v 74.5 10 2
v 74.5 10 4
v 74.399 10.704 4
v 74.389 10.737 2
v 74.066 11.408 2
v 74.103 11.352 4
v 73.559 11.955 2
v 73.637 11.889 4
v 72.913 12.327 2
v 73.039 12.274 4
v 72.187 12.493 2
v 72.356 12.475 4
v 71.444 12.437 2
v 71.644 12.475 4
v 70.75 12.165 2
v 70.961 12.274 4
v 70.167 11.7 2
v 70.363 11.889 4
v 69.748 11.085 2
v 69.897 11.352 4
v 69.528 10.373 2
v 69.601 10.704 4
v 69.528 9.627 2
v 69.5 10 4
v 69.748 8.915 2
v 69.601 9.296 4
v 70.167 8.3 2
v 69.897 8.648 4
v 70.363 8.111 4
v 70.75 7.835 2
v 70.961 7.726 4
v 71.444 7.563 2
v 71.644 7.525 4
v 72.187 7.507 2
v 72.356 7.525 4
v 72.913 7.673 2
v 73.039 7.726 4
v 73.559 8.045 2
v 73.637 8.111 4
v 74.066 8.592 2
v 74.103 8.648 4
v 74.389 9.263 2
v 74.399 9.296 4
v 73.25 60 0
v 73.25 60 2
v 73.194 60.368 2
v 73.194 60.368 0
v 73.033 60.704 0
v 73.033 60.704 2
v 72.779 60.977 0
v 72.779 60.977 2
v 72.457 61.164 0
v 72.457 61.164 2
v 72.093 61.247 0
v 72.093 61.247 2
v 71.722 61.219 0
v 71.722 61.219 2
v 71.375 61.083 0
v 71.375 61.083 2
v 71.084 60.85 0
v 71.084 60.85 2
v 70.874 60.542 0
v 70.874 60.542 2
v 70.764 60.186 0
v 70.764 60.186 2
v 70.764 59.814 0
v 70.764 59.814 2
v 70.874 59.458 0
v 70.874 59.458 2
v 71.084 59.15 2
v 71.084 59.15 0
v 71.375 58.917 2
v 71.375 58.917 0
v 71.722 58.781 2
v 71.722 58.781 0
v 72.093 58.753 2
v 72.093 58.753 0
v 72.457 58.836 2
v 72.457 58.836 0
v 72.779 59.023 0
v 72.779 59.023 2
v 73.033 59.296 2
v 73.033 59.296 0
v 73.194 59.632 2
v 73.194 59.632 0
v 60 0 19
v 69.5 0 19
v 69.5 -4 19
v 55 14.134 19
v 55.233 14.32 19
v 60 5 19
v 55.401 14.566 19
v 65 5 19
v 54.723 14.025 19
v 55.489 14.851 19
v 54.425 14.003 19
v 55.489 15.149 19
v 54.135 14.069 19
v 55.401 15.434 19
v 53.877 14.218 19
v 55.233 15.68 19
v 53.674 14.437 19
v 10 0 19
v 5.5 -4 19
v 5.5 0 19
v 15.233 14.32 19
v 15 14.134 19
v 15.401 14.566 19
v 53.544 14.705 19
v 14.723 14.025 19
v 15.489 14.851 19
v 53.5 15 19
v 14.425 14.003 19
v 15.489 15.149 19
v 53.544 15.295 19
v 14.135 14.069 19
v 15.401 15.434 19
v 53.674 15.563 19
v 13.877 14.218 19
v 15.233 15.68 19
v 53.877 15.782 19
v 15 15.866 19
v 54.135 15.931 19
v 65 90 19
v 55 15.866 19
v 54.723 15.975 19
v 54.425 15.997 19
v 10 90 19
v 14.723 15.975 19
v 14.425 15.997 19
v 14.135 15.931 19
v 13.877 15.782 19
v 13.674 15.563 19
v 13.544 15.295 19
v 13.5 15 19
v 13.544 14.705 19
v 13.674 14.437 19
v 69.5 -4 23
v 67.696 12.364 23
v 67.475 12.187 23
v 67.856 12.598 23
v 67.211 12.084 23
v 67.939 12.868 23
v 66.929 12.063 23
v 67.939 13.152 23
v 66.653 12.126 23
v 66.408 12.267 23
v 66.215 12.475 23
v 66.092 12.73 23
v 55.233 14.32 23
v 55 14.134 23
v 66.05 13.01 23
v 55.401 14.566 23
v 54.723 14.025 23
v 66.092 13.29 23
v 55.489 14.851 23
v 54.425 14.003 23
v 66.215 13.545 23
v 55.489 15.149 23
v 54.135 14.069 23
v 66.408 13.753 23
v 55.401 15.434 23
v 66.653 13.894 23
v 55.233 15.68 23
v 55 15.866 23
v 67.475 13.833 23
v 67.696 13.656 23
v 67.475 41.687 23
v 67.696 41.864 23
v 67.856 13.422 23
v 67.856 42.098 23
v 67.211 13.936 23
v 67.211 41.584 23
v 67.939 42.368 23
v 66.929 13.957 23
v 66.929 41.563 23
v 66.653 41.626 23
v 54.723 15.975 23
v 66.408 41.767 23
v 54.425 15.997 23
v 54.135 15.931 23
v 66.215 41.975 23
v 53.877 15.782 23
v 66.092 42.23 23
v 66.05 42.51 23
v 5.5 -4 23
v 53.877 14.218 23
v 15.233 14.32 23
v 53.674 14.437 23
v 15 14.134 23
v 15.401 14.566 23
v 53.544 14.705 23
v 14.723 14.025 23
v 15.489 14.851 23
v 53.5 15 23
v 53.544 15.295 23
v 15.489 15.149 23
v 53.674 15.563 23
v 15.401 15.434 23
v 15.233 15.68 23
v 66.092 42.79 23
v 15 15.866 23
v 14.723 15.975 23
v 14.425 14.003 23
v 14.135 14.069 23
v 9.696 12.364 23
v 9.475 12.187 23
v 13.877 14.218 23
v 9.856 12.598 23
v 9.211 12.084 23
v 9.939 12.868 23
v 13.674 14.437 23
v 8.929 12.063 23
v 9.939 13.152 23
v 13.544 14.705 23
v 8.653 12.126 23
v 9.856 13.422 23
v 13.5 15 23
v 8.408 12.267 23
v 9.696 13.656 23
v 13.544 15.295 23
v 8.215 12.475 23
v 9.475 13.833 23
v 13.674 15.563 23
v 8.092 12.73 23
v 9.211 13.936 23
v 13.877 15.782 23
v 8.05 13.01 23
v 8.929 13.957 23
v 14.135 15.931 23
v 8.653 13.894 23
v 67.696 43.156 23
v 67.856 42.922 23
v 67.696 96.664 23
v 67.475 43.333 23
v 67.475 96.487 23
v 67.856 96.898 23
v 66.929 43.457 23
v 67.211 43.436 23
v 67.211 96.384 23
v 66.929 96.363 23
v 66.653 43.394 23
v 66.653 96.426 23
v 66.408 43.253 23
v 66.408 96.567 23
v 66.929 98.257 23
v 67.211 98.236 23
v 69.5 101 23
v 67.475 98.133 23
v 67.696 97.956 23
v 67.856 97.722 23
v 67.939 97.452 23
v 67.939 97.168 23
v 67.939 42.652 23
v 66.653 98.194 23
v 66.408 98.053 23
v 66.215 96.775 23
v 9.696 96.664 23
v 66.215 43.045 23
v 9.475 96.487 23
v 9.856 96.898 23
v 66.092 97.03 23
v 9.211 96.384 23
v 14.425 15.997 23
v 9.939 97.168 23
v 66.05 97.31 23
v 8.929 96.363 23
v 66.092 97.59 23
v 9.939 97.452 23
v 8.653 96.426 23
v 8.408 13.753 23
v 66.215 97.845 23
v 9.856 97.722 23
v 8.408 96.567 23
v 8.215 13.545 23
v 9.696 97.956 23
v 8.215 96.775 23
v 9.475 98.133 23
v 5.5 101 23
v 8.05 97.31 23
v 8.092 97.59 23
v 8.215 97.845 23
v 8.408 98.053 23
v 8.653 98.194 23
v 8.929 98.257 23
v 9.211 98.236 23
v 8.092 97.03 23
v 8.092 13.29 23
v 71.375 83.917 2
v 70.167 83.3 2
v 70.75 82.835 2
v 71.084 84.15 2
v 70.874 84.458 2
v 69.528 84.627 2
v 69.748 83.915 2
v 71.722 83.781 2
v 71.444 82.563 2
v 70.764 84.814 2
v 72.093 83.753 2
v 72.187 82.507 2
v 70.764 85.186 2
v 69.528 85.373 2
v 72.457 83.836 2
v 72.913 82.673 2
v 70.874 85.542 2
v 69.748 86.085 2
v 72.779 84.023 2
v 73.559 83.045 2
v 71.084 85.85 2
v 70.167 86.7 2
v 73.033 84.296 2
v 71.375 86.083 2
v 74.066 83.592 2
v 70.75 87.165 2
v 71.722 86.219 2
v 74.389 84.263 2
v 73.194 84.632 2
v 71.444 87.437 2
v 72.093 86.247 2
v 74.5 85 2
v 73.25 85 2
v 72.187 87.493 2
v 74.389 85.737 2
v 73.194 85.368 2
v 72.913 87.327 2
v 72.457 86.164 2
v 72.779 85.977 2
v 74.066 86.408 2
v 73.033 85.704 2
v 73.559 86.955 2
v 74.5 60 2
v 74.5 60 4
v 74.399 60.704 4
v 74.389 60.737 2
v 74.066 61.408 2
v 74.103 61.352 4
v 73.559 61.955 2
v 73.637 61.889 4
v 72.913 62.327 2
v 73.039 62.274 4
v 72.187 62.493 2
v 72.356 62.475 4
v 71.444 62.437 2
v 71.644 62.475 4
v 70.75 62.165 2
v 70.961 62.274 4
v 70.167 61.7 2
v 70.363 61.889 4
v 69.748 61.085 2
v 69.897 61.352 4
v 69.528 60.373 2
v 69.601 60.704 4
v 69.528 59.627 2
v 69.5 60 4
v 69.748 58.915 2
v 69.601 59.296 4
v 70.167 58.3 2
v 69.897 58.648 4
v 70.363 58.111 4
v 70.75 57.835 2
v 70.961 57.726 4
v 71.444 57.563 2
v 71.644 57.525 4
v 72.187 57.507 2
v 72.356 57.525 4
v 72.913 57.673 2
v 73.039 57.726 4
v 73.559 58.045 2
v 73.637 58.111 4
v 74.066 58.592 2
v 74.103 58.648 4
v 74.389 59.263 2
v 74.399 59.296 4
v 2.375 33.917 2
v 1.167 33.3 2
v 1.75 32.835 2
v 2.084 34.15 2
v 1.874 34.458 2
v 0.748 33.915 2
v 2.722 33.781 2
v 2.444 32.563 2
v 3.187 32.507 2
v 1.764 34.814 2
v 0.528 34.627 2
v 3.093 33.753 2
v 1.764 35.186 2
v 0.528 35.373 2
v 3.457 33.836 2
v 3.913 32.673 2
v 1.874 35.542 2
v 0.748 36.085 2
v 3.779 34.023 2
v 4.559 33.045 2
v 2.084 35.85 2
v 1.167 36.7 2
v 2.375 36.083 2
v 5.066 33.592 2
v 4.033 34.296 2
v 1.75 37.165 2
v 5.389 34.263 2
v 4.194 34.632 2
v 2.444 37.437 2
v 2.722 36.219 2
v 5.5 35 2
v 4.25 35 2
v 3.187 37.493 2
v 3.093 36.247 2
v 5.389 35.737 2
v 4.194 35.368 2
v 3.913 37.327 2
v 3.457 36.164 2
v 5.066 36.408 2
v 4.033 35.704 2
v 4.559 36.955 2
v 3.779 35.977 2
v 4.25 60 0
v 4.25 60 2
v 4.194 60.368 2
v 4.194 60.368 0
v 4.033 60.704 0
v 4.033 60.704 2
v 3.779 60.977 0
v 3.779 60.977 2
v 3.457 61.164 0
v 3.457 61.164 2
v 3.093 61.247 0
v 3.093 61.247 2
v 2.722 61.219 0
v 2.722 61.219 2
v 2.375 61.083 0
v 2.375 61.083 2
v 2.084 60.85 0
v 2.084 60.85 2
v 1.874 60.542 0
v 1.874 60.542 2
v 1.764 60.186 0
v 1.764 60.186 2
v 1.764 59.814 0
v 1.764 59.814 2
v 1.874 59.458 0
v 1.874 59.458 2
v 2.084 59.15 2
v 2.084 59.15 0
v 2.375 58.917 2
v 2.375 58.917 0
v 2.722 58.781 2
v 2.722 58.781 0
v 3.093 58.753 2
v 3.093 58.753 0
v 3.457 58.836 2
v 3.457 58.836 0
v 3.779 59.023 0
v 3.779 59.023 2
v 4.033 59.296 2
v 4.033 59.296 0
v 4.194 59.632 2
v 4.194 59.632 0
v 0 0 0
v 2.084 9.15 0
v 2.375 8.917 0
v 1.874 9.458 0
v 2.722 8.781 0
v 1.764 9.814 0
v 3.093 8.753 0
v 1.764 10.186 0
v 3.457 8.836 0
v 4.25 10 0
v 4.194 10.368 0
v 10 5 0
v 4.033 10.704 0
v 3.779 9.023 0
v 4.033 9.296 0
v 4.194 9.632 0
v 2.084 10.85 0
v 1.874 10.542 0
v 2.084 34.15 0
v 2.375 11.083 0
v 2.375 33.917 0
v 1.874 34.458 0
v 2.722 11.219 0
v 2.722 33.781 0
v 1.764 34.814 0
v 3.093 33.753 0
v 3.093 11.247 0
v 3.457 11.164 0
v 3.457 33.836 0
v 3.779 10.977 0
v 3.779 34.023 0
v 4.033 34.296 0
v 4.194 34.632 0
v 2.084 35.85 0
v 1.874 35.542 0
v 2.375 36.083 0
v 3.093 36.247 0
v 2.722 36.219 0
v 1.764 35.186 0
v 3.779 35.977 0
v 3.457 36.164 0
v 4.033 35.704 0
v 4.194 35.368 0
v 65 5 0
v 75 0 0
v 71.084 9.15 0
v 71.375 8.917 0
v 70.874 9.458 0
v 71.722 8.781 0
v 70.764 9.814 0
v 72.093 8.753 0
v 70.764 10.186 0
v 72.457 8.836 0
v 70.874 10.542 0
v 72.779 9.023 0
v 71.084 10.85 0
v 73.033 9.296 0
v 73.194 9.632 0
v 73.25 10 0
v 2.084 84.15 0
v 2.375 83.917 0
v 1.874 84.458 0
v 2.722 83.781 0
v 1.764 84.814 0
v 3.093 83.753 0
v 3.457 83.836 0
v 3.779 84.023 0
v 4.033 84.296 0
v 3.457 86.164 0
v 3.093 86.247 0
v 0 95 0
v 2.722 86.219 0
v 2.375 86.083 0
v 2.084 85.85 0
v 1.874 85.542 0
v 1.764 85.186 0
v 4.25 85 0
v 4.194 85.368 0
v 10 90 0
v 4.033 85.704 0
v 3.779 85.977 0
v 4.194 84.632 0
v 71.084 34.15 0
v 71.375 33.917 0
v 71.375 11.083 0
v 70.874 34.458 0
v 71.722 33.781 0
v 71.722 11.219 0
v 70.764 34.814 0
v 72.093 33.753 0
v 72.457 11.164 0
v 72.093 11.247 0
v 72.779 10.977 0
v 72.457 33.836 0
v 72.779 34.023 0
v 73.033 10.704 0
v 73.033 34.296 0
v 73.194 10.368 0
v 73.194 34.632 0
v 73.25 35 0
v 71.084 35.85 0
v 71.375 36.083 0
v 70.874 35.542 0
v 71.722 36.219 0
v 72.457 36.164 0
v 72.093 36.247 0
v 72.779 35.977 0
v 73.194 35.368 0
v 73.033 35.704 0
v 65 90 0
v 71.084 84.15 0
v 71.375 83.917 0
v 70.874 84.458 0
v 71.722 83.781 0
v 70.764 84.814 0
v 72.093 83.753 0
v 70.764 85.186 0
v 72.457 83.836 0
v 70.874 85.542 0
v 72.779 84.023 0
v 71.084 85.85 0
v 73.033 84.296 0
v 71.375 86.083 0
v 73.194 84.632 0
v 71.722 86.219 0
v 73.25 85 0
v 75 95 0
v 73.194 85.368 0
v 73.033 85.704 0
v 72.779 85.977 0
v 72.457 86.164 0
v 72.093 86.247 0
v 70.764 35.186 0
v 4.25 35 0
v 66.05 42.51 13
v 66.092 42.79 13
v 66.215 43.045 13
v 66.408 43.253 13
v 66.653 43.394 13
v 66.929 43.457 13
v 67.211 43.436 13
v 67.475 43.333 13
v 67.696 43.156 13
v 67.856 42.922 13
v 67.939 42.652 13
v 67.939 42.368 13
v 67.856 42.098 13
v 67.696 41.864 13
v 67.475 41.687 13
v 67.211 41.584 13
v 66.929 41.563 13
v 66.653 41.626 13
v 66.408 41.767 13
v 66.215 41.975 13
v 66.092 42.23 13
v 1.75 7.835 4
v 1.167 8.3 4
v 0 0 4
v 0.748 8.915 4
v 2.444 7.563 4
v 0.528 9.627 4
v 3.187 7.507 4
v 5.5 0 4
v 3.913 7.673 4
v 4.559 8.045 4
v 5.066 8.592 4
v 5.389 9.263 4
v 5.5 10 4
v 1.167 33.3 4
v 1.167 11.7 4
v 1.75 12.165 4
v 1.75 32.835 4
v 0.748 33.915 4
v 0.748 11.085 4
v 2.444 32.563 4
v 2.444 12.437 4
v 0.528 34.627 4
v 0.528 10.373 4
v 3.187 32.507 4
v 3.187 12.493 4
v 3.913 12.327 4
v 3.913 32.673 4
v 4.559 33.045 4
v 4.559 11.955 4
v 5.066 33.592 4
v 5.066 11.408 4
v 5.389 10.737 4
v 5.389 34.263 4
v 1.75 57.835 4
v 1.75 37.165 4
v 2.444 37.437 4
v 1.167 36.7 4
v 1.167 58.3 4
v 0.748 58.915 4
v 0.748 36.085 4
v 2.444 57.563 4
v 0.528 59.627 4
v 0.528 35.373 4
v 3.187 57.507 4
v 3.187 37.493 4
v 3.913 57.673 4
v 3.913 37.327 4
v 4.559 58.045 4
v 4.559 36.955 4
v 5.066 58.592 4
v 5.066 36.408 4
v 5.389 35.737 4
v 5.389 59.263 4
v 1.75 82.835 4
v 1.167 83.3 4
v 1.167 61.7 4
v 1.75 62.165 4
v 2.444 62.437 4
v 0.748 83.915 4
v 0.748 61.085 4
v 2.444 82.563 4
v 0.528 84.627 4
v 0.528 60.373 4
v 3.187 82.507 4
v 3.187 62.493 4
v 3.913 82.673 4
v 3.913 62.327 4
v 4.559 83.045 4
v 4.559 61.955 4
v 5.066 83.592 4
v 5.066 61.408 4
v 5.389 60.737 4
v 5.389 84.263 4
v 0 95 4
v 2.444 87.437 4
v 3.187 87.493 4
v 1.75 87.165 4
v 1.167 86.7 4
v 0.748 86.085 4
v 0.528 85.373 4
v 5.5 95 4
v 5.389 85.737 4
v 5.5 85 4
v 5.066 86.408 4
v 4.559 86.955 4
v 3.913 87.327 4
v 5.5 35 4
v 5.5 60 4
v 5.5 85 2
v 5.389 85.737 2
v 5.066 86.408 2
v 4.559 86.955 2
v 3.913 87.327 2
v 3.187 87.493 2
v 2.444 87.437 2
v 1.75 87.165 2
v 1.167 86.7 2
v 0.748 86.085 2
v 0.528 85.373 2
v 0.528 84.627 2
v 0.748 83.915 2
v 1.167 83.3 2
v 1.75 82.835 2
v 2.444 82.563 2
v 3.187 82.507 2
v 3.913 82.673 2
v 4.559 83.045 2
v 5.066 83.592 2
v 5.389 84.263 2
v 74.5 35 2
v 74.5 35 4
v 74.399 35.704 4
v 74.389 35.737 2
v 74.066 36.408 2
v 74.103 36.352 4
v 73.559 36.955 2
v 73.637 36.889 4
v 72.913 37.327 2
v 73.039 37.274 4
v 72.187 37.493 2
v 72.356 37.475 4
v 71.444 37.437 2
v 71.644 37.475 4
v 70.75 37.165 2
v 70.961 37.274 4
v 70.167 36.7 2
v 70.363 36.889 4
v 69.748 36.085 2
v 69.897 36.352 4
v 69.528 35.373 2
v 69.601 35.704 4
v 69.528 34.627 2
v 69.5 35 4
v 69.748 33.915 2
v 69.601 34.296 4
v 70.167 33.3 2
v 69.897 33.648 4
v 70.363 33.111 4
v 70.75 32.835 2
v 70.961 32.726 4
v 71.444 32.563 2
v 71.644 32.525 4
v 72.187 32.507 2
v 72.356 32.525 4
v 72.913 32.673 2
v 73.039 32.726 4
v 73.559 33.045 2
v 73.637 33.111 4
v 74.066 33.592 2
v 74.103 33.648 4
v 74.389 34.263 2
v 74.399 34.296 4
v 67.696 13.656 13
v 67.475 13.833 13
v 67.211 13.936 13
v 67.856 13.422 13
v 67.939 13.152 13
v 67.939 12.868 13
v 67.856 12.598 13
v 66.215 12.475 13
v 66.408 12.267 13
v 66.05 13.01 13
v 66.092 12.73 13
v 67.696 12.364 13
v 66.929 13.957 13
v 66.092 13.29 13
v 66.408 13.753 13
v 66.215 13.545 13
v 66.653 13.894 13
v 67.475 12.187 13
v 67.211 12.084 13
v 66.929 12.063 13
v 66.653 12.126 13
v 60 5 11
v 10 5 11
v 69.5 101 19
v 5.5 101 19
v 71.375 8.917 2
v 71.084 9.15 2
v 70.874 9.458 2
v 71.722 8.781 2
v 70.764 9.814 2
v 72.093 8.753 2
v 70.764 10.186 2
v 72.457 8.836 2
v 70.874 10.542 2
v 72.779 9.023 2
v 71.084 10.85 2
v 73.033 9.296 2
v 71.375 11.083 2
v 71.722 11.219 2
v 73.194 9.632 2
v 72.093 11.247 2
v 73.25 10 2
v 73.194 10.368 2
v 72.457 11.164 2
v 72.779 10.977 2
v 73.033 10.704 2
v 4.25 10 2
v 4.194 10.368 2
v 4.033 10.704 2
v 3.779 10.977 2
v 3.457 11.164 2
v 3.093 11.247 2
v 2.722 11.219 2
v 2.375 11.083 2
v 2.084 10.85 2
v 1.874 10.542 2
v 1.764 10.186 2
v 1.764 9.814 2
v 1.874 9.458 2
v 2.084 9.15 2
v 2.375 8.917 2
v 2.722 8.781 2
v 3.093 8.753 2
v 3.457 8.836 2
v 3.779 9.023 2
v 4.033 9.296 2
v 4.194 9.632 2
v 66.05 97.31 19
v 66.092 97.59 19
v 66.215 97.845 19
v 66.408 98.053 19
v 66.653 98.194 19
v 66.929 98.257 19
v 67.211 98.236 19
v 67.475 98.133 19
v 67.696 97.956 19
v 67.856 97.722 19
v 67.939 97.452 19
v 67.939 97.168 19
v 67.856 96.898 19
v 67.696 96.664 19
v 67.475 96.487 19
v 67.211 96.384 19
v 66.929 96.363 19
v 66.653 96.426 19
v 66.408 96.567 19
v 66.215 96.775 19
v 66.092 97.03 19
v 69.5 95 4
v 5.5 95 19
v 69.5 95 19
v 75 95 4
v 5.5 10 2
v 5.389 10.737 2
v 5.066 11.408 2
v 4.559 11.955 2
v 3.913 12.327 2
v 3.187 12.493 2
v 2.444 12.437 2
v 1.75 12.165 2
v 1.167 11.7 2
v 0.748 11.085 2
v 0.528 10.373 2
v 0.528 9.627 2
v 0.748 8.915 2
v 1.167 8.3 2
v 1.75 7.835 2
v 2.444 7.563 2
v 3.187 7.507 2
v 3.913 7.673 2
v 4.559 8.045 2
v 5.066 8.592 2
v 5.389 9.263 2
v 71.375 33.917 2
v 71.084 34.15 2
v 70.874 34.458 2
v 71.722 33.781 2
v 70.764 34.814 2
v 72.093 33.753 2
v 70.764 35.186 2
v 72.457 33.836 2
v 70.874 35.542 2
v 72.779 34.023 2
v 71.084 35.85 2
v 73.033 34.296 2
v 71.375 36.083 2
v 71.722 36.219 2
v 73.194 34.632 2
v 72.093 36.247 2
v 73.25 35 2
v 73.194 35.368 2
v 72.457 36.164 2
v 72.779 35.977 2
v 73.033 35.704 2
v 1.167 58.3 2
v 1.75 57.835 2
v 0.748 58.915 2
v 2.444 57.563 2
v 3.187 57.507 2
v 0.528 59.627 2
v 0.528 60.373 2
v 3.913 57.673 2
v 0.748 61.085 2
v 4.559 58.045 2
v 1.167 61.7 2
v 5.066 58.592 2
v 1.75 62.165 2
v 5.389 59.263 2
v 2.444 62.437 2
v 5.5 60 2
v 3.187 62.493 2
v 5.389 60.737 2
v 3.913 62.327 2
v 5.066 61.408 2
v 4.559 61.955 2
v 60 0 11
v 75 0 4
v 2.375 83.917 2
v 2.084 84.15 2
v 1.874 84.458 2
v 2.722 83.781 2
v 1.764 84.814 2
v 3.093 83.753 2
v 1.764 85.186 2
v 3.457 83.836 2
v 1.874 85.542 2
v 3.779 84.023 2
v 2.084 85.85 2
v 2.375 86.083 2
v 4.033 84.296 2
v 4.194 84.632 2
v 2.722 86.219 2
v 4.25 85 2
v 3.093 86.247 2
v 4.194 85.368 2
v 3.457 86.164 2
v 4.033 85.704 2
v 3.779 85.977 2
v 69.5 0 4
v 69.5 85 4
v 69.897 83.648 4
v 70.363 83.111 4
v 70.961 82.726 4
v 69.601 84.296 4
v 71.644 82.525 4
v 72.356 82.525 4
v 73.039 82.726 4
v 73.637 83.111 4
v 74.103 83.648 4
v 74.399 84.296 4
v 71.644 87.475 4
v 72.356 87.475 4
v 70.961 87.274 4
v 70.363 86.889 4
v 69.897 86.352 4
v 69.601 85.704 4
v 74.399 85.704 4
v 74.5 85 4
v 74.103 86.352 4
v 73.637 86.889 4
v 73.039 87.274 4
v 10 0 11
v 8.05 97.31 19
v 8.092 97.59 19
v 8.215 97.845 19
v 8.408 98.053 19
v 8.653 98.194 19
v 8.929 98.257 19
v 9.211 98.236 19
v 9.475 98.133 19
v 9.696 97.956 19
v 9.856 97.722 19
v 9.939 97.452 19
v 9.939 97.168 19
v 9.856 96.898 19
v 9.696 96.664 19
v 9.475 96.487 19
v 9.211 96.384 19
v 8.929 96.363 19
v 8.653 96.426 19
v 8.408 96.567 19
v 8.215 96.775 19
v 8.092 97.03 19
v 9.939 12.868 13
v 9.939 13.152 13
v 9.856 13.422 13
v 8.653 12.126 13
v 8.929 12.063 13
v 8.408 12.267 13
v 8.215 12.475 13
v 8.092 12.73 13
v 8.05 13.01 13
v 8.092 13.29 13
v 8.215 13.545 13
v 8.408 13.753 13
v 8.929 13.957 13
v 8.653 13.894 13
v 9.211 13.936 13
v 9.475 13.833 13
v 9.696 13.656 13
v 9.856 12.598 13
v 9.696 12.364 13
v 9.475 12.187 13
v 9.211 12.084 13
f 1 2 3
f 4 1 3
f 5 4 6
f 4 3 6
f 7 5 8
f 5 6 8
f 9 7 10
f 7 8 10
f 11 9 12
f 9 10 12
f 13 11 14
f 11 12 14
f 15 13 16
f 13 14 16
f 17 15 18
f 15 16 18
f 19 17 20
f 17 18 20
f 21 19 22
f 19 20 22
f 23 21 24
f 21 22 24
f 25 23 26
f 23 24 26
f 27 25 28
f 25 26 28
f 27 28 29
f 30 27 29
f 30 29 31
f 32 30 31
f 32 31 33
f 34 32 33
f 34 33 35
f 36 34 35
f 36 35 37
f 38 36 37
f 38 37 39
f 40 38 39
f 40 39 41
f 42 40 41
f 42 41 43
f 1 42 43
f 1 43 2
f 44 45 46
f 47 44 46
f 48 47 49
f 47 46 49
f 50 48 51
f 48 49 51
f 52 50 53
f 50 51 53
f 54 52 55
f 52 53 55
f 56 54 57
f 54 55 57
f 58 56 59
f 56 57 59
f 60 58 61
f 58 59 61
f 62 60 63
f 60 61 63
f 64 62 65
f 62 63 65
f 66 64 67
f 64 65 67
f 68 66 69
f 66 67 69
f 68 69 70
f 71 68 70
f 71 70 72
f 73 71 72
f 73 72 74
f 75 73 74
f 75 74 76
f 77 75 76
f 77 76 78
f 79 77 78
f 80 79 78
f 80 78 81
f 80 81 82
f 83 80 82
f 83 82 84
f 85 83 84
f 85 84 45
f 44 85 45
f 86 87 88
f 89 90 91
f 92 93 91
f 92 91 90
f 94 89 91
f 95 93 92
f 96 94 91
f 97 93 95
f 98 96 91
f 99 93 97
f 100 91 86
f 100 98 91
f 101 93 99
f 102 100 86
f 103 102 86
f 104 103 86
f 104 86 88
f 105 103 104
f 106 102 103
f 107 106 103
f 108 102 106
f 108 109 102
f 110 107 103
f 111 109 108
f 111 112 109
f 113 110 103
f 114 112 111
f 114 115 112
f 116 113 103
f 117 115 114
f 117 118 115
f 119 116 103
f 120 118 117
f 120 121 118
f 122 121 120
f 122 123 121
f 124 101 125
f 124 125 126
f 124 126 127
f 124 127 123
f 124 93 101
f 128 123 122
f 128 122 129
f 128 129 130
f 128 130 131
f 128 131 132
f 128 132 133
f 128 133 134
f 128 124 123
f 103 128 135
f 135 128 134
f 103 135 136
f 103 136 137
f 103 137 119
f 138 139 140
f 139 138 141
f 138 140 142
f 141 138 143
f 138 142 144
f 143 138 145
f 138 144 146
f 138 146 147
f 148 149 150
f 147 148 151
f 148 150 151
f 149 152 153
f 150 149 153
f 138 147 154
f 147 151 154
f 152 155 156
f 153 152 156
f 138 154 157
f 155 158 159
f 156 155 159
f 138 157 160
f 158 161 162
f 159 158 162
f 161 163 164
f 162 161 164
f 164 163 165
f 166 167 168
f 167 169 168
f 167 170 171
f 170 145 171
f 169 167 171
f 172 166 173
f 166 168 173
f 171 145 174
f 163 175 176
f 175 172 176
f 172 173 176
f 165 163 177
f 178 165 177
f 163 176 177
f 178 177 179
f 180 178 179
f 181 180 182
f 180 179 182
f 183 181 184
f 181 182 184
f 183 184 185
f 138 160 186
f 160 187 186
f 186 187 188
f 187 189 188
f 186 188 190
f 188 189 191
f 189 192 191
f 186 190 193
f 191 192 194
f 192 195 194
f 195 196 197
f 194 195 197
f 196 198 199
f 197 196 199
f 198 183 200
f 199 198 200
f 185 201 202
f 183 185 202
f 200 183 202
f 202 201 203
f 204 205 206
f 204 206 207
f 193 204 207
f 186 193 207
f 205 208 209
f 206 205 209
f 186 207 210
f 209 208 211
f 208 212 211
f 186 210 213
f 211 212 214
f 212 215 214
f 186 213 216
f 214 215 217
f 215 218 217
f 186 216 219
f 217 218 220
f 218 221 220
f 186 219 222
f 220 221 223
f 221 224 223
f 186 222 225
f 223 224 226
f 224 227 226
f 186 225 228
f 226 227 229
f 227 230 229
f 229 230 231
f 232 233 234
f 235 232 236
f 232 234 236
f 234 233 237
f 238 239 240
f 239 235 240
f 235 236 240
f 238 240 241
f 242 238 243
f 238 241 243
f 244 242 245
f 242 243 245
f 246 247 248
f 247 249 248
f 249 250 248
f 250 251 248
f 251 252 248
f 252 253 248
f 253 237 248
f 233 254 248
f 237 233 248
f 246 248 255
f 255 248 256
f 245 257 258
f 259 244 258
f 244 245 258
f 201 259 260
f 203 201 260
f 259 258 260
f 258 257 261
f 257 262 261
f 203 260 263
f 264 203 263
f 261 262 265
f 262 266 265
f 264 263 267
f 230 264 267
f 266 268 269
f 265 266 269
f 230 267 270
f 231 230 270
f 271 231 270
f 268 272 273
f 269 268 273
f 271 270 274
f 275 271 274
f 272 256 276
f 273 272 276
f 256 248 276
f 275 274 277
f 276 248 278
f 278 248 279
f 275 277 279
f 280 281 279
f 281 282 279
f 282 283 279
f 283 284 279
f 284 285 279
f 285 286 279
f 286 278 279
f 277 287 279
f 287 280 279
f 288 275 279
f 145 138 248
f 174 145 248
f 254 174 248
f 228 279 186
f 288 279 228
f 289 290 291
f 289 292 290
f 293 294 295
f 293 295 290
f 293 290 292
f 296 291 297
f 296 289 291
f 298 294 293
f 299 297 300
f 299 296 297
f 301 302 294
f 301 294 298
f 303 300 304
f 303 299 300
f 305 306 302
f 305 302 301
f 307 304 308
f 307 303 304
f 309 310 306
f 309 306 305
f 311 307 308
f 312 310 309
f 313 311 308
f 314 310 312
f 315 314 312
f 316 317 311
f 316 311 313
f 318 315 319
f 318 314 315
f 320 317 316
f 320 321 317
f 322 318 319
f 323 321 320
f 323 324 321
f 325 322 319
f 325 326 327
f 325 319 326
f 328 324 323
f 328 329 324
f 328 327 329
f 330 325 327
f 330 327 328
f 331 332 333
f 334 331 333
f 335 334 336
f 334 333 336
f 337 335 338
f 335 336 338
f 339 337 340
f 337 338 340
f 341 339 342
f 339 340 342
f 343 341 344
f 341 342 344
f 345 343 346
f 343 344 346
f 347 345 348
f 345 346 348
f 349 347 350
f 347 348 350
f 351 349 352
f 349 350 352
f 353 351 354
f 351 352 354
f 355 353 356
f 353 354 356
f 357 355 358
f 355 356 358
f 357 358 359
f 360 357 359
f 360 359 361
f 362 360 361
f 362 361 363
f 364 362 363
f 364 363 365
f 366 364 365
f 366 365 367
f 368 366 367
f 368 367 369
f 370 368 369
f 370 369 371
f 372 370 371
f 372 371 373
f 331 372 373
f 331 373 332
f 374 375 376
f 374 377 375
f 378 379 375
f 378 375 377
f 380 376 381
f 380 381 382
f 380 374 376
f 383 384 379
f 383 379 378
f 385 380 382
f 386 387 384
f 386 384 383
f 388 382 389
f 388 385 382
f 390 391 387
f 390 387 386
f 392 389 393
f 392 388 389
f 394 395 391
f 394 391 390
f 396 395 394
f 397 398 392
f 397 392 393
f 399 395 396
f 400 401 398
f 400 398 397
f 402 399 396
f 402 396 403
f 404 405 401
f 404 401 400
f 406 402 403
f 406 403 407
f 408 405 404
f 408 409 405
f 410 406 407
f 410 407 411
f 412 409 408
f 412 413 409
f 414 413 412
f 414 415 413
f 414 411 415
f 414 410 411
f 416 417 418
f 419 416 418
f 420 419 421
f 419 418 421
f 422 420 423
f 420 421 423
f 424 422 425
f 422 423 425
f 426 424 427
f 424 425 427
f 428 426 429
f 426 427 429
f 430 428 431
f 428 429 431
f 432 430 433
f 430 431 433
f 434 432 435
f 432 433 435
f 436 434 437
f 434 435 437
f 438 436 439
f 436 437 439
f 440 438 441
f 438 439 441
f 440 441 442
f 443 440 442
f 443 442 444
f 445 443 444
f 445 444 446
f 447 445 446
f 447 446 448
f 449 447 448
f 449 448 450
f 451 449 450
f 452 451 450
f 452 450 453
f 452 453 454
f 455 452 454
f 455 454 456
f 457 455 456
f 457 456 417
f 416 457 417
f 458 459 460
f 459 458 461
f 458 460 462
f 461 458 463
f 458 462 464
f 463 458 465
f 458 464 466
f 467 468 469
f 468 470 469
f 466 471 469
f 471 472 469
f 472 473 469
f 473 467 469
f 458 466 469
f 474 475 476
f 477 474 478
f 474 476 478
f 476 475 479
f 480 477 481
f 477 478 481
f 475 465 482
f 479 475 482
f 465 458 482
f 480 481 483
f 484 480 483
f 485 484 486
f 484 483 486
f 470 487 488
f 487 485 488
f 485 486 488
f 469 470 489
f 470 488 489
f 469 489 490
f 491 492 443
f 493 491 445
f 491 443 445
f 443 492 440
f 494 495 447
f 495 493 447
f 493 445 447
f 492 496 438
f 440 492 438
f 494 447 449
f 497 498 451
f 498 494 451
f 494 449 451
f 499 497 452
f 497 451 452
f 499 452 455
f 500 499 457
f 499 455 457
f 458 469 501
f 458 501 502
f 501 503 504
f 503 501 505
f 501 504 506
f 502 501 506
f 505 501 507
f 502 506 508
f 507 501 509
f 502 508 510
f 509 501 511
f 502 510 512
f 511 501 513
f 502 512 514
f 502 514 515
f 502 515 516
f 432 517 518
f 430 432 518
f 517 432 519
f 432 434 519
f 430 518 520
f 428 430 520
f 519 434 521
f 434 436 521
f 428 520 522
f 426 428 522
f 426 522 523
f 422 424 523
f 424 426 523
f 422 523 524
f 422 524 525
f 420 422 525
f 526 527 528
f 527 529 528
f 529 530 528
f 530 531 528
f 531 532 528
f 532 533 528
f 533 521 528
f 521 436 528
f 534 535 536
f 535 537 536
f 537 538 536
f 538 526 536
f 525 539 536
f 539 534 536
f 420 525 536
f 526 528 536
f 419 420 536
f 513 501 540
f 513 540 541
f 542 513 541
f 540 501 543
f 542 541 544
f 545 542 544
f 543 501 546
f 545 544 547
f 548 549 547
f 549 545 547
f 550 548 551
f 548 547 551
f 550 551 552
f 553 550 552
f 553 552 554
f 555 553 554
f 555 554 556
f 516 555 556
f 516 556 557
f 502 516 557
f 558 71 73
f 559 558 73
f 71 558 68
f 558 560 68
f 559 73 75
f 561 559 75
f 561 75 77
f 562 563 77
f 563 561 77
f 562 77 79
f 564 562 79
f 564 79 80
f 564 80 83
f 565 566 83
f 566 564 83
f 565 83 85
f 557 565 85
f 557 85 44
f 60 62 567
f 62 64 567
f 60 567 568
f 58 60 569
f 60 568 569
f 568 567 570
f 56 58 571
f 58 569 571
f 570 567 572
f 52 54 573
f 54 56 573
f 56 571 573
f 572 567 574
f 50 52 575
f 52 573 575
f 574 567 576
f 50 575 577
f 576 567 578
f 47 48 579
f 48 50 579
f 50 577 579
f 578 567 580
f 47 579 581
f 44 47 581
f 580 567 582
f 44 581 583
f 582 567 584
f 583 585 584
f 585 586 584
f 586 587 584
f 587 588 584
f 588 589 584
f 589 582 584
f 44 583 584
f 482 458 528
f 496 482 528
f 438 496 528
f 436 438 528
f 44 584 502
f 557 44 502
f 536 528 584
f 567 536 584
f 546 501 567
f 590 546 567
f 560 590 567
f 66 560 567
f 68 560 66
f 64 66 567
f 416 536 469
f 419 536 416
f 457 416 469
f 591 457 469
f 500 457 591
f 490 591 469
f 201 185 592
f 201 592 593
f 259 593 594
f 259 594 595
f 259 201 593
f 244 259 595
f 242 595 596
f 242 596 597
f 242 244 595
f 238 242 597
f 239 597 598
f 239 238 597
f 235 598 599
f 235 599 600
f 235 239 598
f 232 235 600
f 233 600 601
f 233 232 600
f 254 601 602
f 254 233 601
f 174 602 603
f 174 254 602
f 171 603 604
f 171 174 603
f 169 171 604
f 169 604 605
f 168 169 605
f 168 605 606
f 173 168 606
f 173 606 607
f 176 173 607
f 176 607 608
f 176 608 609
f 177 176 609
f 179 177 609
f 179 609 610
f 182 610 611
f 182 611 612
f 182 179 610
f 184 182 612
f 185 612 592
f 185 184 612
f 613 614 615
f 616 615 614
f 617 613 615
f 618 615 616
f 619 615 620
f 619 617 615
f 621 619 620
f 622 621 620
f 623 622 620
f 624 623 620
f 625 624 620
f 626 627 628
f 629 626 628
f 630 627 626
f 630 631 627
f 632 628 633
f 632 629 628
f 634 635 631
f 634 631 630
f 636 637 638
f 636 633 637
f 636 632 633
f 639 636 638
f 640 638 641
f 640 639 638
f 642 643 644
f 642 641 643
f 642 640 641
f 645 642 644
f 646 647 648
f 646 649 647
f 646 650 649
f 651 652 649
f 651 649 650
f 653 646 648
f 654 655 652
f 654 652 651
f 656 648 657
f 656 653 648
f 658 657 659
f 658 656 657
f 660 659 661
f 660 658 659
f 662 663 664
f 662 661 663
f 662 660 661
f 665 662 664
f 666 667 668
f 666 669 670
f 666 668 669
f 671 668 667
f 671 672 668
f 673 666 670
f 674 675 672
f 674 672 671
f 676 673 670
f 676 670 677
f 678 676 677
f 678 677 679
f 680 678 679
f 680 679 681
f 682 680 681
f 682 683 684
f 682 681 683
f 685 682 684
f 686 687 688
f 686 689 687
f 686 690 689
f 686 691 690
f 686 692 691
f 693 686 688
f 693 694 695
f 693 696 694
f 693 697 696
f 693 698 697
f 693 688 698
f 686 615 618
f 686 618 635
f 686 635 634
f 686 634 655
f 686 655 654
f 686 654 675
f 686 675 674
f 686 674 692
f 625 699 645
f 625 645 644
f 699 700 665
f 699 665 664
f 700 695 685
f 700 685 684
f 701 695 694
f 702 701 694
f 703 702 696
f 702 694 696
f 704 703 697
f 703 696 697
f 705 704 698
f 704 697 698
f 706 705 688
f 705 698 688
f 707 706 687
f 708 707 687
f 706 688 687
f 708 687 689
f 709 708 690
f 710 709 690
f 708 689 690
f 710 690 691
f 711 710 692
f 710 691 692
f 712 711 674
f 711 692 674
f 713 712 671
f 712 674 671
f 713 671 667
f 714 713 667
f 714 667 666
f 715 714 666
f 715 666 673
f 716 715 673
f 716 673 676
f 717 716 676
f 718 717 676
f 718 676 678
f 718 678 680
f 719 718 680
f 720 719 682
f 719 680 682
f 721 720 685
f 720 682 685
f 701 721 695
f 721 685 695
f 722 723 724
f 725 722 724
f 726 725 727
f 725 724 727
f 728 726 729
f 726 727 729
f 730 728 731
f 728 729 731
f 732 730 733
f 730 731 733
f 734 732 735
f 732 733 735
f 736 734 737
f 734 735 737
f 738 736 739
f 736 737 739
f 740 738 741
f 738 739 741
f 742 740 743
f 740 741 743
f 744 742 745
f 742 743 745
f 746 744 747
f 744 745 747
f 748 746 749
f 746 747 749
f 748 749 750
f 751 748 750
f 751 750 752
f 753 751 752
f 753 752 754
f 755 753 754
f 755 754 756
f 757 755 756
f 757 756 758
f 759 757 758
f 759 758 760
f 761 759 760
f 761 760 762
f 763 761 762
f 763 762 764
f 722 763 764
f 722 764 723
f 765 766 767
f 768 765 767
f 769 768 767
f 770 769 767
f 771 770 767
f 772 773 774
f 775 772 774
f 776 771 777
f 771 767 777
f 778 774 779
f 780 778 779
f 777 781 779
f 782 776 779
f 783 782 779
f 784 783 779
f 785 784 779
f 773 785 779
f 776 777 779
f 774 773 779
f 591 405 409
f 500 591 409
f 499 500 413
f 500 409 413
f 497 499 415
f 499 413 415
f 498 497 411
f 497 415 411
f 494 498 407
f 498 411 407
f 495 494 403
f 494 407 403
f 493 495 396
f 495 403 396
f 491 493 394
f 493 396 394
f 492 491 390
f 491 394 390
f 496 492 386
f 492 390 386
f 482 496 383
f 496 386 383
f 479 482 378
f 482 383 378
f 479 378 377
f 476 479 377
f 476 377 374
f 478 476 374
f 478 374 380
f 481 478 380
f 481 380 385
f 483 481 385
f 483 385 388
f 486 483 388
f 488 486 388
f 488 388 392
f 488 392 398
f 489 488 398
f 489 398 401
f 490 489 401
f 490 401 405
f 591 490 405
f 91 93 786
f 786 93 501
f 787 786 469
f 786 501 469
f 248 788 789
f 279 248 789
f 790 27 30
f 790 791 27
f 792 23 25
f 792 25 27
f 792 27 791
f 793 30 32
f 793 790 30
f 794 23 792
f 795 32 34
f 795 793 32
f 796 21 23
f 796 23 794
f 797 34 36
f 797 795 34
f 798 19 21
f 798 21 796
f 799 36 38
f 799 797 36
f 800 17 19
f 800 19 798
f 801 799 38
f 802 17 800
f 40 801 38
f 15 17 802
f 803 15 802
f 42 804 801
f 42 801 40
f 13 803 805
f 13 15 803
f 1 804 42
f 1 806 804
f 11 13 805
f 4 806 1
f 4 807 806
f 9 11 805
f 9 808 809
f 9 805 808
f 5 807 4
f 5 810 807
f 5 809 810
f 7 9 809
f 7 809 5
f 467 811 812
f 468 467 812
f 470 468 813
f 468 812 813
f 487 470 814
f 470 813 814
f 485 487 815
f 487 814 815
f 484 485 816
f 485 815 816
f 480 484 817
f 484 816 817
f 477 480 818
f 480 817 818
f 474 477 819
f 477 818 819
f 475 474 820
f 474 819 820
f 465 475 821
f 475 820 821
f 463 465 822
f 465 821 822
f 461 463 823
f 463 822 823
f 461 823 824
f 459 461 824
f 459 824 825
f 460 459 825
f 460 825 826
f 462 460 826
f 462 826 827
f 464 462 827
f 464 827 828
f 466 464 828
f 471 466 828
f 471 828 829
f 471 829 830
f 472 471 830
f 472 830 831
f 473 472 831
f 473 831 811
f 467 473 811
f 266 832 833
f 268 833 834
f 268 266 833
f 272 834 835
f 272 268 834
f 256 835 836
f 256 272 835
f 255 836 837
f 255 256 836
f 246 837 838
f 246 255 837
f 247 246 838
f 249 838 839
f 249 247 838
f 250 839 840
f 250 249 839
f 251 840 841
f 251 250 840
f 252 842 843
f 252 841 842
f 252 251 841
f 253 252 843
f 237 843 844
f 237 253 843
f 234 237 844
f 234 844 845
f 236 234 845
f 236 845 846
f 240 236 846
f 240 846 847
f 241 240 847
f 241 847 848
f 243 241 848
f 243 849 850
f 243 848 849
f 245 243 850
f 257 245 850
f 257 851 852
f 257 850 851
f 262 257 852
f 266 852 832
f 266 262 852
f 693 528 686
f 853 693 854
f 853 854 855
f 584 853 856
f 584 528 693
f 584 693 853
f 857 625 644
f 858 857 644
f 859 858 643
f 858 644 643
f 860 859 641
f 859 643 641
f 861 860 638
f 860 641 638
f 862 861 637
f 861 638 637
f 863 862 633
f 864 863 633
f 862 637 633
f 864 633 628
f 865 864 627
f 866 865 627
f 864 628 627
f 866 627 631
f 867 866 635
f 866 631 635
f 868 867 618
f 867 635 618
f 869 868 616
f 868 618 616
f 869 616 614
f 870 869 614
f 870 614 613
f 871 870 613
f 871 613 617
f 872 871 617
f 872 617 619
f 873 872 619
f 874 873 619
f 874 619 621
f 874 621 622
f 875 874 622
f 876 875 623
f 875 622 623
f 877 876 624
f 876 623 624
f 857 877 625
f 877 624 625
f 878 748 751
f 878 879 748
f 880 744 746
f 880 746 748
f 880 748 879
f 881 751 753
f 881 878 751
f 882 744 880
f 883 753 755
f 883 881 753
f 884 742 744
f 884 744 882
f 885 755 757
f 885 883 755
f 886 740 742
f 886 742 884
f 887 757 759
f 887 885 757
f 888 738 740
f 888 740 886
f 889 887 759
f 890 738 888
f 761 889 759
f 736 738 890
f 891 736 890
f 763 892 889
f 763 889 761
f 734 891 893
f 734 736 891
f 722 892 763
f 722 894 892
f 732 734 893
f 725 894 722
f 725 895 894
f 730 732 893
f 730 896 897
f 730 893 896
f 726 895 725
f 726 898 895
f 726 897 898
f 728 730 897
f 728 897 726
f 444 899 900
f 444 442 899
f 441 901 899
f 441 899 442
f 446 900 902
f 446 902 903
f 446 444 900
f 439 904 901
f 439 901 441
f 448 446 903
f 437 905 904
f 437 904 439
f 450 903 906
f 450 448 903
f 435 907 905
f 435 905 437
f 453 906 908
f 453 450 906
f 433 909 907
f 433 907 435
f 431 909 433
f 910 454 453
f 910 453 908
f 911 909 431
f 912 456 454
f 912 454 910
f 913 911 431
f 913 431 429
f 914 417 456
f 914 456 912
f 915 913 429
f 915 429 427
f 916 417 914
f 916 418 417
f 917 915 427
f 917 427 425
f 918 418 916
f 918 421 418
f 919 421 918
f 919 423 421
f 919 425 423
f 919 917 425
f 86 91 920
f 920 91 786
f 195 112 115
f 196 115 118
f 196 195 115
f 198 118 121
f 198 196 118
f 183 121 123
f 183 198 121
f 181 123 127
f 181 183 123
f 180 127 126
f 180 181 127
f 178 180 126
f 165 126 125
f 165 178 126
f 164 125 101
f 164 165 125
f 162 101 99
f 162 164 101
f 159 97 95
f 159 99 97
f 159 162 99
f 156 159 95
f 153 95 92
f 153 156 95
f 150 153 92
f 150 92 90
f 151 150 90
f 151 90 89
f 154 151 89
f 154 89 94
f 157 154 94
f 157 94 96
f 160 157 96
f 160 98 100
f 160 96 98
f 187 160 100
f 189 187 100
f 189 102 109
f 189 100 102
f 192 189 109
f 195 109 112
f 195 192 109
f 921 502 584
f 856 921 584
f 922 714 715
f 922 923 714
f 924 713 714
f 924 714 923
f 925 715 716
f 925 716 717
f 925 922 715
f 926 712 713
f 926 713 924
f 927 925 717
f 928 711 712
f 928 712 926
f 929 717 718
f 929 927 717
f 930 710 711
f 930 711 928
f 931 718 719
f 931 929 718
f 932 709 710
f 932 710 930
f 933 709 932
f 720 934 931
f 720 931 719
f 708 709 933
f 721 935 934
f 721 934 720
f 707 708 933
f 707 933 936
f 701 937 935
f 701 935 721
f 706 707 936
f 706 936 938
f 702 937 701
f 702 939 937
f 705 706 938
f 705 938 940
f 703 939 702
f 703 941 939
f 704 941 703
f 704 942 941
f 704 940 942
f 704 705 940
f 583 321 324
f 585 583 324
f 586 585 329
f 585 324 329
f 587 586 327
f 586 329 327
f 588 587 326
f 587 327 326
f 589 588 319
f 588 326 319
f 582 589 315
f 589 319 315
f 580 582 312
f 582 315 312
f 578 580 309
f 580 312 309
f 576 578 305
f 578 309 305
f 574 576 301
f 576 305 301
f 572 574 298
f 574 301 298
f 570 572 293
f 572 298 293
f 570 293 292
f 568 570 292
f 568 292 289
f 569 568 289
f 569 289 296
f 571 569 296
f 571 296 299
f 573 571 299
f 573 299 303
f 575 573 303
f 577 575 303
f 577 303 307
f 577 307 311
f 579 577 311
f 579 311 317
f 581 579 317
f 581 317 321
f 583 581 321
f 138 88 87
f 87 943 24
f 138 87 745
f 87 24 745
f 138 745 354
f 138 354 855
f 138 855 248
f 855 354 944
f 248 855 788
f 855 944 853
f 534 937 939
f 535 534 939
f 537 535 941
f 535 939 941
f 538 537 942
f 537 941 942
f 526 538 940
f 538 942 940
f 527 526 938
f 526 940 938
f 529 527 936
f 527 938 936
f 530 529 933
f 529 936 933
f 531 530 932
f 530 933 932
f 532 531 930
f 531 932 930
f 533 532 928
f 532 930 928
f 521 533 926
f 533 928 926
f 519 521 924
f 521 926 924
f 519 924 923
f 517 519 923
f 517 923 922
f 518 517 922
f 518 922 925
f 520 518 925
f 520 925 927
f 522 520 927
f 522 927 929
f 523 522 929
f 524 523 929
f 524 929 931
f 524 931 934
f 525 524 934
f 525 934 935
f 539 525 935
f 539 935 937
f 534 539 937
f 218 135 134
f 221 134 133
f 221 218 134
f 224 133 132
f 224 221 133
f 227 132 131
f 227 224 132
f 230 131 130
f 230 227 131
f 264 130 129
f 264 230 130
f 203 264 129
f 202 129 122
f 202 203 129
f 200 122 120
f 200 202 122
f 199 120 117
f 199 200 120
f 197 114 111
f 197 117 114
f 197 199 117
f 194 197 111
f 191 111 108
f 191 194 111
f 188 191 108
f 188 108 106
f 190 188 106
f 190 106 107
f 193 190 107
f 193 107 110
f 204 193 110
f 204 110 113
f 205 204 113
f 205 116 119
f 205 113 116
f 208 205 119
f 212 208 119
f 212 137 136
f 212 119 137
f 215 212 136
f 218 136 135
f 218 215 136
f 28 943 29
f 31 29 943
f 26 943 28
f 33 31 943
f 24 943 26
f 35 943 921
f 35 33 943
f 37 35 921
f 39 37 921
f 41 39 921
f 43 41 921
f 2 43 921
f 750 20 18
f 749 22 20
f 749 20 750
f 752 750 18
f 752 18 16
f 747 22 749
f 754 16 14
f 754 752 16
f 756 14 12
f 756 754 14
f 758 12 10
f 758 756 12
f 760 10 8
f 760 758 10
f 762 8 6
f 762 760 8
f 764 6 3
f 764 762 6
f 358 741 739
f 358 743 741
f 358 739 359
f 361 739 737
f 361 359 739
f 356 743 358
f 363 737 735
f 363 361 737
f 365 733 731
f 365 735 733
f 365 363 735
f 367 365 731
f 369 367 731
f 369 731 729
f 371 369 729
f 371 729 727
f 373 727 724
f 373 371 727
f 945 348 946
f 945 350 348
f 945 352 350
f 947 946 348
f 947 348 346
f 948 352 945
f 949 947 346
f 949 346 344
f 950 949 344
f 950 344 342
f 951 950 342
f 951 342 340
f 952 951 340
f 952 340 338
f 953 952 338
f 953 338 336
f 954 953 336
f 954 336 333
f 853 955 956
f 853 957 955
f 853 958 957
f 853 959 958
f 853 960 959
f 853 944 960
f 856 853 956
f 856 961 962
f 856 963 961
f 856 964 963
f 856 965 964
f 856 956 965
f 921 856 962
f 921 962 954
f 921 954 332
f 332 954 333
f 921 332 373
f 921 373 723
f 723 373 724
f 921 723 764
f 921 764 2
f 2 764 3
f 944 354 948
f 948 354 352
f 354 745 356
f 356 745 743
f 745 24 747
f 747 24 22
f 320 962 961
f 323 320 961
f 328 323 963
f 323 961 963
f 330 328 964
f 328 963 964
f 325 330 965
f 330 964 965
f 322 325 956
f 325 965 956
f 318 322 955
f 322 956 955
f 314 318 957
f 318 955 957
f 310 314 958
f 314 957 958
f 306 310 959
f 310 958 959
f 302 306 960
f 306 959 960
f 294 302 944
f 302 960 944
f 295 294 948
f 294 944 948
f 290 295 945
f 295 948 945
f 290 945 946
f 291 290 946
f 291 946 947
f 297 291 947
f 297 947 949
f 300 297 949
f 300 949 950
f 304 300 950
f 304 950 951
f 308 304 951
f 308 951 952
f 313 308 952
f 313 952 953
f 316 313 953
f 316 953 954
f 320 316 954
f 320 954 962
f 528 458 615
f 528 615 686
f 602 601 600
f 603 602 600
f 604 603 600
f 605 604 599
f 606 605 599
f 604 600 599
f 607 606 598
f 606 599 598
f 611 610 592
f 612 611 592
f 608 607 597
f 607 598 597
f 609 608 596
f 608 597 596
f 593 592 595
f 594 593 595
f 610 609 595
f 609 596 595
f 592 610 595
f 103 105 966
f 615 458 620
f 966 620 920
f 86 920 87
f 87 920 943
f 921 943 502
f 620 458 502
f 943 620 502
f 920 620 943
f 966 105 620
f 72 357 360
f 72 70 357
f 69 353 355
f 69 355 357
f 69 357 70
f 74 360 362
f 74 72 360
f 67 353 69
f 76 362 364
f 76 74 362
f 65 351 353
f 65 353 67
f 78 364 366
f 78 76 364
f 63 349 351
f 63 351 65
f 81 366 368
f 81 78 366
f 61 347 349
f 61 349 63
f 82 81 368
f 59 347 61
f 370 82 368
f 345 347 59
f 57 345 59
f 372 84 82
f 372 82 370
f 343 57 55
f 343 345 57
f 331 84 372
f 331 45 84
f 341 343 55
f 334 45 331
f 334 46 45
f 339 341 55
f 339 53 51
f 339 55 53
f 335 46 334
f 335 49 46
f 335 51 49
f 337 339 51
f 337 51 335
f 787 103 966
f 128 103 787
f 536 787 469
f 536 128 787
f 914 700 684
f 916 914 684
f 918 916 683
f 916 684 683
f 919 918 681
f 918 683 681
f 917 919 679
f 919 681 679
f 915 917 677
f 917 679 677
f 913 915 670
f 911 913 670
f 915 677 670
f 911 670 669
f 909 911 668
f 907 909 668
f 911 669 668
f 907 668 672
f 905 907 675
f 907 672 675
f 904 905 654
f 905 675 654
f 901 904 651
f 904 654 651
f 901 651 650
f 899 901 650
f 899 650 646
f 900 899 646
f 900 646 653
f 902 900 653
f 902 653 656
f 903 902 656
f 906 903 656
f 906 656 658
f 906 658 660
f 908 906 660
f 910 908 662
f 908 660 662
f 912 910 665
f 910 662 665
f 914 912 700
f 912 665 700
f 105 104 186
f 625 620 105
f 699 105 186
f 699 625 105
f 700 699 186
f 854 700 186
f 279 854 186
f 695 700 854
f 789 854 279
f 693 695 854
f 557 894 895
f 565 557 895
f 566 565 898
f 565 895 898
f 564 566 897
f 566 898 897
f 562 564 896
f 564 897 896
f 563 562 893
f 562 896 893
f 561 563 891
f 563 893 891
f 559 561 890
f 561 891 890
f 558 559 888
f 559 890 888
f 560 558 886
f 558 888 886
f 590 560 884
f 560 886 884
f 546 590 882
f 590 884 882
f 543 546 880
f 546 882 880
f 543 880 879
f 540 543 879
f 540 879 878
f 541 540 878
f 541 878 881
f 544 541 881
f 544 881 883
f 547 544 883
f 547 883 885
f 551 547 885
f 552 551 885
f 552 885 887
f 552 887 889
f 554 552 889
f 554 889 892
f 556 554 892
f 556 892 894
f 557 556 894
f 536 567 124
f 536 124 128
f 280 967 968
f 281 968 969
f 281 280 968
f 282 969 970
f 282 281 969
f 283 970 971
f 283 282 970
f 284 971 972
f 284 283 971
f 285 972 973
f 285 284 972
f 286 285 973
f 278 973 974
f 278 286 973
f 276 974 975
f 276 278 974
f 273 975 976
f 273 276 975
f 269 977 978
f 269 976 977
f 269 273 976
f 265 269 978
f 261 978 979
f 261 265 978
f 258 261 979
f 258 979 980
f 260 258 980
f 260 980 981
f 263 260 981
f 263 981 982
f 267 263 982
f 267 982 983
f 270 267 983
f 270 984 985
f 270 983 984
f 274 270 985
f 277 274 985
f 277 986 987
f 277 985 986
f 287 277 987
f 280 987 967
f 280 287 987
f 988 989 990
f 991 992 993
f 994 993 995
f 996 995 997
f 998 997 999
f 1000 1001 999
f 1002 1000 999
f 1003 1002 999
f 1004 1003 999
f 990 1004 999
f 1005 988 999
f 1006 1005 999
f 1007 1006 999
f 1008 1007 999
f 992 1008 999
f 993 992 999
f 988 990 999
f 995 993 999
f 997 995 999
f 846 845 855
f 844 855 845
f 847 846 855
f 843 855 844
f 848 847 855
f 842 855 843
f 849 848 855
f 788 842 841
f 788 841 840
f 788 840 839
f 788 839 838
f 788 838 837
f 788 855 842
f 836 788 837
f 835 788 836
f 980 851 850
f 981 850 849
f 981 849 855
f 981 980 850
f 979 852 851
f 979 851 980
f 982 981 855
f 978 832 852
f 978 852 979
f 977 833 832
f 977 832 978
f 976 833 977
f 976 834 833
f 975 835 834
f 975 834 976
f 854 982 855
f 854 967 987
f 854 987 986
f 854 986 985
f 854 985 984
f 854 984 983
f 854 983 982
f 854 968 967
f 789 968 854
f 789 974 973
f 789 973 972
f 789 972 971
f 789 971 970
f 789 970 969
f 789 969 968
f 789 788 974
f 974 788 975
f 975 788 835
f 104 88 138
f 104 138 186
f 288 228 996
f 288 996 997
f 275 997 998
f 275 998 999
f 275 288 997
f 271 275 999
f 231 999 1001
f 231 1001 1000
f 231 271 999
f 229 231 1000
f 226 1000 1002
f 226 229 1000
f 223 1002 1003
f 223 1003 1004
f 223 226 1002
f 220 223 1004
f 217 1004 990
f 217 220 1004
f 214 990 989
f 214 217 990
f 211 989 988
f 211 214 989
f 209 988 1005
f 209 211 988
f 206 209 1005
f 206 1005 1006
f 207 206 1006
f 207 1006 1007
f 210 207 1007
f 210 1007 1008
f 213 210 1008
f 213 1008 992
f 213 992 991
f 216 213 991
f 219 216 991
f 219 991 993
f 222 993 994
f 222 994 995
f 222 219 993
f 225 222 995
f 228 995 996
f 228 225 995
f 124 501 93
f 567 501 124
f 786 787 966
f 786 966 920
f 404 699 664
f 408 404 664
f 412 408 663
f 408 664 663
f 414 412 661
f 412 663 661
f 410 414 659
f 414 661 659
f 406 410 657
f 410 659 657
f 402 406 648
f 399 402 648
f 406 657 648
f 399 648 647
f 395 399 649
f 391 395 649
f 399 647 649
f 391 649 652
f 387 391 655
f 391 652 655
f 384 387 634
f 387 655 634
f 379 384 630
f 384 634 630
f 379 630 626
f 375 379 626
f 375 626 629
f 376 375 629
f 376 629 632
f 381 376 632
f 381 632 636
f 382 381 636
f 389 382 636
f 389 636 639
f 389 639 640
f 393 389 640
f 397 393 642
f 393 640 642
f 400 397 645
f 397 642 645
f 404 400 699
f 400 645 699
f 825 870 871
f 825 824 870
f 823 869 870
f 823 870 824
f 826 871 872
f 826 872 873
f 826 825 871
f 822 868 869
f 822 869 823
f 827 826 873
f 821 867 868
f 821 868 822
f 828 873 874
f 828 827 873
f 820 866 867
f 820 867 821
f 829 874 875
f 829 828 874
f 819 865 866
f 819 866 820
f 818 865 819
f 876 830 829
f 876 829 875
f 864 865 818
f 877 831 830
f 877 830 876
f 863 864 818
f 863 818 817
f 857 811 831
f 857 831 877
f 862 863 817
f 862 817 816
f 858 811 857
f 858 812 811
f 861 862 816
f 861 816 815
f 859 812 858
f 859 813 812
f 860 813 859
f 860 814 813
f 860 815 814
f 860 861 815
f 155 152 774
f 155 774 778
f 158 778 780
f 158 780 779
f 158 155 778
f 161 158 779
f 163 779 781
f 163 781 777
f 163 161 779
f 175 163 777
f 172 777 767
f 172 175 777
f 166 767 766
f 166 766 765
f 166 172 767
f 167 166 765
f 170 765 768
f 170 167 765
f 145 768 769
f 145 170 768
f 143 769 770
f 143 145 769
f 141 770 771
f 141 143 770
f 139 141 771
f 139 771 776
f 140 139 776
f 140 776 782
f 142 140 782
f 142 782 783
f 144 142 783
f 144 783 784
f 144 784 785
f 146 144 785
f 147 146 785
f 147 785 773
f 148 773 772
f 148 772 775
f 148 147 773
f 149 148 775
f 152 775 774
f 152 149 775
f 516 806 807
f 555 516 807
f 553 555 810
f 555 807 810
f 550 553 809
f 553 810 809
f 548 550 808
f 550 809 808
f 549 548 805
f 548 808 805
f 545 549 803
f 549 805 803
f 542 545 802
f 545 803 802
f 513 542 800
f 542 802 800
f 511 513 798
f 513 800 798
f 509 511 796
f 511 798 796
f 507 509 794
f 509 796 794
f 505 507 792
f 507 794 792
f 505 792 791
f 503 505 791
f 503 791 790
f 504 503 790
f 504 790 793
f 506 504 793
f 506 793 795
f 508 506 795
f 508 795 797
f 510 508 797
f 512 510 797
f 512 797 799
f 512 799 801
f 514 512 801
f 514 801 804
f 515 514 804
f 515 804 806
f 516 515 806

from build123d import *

# Parameters (mm, degrees)
SKETCH1_W           = 75
SKETCH1_H           = 95
BOSS_EXTRUDE1_DEPTH = 23
SKETCH3_W           = 55
SKETCH3_H           = 85
CUT_EXTRUDE2_DEPTH  = 19
SKETCH11_W          = 64
SKETCH11_H          = 105
BOSS_EXTRUDE2_DEPTH = 4
SKETCH5_W           = 5.5
SKETCH5_H           = 95
CUT_EXTRUDE4_DEPTH  = 19
SKETCH4_R           = 0.95
SKETCH4_R_2         = 1
CUT_EXTRUDE3_DEPTH  = 10
SKETCH6_R           = 1.25
CUT_EXTRUDE5_DEPTH  = 5
CUT_EXTRUDE6_REACH  = 11
SKETCH7_W           = 50
SKETCH7_H           = 8
SKETCH10_R          = 2.5
CUT_EXTRUDE9_DEPTH  = 2


with BuildPart() as part:
    # Sketch1 → Boss-Extrude1 (new body)
    with BuildSketch(Plane.XY):
        with Locations((37.5, 47.5)):
            Rectangle(SKETCH1_W, SKETCH1_H)
    extrude(amount=BOSS_EXTRUDE1_DEPTH)

    # Sketch3 → Cut-Extrude2 (cut)
    with BuildSketch(Plane(origin=(0, 0, 0), x_dir=(-1, 0, 0), z_dir=(0, 0, -1))):
        with Locations((-37.5, 47.5)):
            Rectangle(SKETCH3_W, SKETCH3_H)
    extrude(amount=-CUT_EXTRUDE2_DEPTH, mode=Mode.SUBTRACT)

    # Sketch11 → Boss-Extrude2 (add)
    with BuildSketch(Plane(origin=(0, 0, 19), x_dir=(-1, 0, 0), z_dir=(0, 0, -1))):
        with Locations((-37.5, 48.5)):
            Rectangle(SKETCH11_W, SKETCH11_H)
    extrude(amount=-BOSS_EXTRUDE2_DEPTH)

    # Sketch5 → Cut-Extrude4 (cut)
    with BuildSketch(Plane.XY.offset(23)):
        with Locations((72.25, 47.5)):
            Rectangle(SKETCH5_W, SKETCH5_H)
        with Locations((2.75, 47.5)):
            Rectangle(SKETCH5_W, SKETCH5_H)
    extrude(amount=-CUT_EXTRUDE4_DEPTH, mode=Mode.SUBTRACT)

    # Sketch4 → Cut-Extrude3 (cut)
    with BuildSketch(Plane(origin=(0, 0, 23), x_dir=(-1, 0, 0), z_dir=(0, 0, -1))):
        with Locations((-9, 97.31)):
            Circle(SKETCH4_R)
        with Locations((-67, 97.31)):
            Circle(SKETCH4_R)
        with Locations((-67, 42.51)):
            Circle(SKETCH4_R)
        with Locations((-67, 13.01)):
            Circle(SKETCH4_R)
        with Locations((-9, 13.01)):
            Circle(SKETCH4_R)
        with Locations((-14.5, 15)):
            Circle(SKETCH4_R_2)
        with Locations((-54.5, 15)):
            Circle(SKETCH4_R_2)
    extrude(amount=CUT_EXTRUDE3_DEPTH, mode=Mode.SUBTRACT)

    # Sketch6 → Cut-Extrude5 (cut, through all)
    with BuildSketch(Plane.XY.offset(4)):
        with Locations((72, 10)):
            Circle(SKETCH6_R)
        with Locations((3, 10)):
            Circle(SKETCH6_R)
        with Locations((72, 35)):
            Circle(SKETCH6_R)
        with Locations((3, 35)):
            Circle(SKETCH6_R)
        with Locations((72, 60)):
            Circle(SKETCH6_R)
        with Locations((3, 60)):
            Circle(SKETCH6_R)
        with Locations((72, 85)):
            Circle(SKETCH6_R)
        with Locations((3, 85)):
            Circle(SKETCH6_R)
    extrude(amount=-CUT_EXTRUDE5_DEPTH, mode=Mode.SUBTRACT)

    # Sketch7 → Cut-Extrude6 (cut, up to next)
    with BuildSketch(Plane(origin=(0, 5, 0), x_dir=(1, 0, 0), z_dir=(0, 1, 0)), mode=Mode.PRIVATE) as cut_extrude6_sk1:
        with Locations((35, -15)):
            Rectangle(SKETCH7_W, SKETCH7_H)
    cut_extrude6_tool1 = extrude(cut_extrude6_sk1.sketch, amount=-CUT_EXTRUDE6_REACH, mode=Mode.PRIVATE) & part.part
    add(cut_extrude6_tool1.solids().sort_by_distance((35, 5, 15))[0], mode=Mode.SUBTRACT)

    # Sketch10 → Cut-Extrude9 (cut)
    with BuildSketch(Plane.XY.offset(4)):
        with Locations((72, 10)):
            Circle(SKETCH10_R)
        with Locations((72, 35)):
            Circle(SKETCH10_R)
        with Locations((72, 60)):
            Circle(SKETCH10_R)
        with Locations((72, 85)):
            Circle(SKETCH10_R)
        with Locations((3, 10)):
            Circle(SKETCH10_R)
        with Locations((3, 35)):
            Circle(SKETCH10_R)
        with Locations((3, 60)):
            Circle(SKETCH10_R)
        with Locations((3, 85)):
            Circle(SKETCH10_R)
    extrude(amount=-CUT_EXTRUDE9_DEPTH, mode=Mode.SUBTRACT)


solid = part.part
